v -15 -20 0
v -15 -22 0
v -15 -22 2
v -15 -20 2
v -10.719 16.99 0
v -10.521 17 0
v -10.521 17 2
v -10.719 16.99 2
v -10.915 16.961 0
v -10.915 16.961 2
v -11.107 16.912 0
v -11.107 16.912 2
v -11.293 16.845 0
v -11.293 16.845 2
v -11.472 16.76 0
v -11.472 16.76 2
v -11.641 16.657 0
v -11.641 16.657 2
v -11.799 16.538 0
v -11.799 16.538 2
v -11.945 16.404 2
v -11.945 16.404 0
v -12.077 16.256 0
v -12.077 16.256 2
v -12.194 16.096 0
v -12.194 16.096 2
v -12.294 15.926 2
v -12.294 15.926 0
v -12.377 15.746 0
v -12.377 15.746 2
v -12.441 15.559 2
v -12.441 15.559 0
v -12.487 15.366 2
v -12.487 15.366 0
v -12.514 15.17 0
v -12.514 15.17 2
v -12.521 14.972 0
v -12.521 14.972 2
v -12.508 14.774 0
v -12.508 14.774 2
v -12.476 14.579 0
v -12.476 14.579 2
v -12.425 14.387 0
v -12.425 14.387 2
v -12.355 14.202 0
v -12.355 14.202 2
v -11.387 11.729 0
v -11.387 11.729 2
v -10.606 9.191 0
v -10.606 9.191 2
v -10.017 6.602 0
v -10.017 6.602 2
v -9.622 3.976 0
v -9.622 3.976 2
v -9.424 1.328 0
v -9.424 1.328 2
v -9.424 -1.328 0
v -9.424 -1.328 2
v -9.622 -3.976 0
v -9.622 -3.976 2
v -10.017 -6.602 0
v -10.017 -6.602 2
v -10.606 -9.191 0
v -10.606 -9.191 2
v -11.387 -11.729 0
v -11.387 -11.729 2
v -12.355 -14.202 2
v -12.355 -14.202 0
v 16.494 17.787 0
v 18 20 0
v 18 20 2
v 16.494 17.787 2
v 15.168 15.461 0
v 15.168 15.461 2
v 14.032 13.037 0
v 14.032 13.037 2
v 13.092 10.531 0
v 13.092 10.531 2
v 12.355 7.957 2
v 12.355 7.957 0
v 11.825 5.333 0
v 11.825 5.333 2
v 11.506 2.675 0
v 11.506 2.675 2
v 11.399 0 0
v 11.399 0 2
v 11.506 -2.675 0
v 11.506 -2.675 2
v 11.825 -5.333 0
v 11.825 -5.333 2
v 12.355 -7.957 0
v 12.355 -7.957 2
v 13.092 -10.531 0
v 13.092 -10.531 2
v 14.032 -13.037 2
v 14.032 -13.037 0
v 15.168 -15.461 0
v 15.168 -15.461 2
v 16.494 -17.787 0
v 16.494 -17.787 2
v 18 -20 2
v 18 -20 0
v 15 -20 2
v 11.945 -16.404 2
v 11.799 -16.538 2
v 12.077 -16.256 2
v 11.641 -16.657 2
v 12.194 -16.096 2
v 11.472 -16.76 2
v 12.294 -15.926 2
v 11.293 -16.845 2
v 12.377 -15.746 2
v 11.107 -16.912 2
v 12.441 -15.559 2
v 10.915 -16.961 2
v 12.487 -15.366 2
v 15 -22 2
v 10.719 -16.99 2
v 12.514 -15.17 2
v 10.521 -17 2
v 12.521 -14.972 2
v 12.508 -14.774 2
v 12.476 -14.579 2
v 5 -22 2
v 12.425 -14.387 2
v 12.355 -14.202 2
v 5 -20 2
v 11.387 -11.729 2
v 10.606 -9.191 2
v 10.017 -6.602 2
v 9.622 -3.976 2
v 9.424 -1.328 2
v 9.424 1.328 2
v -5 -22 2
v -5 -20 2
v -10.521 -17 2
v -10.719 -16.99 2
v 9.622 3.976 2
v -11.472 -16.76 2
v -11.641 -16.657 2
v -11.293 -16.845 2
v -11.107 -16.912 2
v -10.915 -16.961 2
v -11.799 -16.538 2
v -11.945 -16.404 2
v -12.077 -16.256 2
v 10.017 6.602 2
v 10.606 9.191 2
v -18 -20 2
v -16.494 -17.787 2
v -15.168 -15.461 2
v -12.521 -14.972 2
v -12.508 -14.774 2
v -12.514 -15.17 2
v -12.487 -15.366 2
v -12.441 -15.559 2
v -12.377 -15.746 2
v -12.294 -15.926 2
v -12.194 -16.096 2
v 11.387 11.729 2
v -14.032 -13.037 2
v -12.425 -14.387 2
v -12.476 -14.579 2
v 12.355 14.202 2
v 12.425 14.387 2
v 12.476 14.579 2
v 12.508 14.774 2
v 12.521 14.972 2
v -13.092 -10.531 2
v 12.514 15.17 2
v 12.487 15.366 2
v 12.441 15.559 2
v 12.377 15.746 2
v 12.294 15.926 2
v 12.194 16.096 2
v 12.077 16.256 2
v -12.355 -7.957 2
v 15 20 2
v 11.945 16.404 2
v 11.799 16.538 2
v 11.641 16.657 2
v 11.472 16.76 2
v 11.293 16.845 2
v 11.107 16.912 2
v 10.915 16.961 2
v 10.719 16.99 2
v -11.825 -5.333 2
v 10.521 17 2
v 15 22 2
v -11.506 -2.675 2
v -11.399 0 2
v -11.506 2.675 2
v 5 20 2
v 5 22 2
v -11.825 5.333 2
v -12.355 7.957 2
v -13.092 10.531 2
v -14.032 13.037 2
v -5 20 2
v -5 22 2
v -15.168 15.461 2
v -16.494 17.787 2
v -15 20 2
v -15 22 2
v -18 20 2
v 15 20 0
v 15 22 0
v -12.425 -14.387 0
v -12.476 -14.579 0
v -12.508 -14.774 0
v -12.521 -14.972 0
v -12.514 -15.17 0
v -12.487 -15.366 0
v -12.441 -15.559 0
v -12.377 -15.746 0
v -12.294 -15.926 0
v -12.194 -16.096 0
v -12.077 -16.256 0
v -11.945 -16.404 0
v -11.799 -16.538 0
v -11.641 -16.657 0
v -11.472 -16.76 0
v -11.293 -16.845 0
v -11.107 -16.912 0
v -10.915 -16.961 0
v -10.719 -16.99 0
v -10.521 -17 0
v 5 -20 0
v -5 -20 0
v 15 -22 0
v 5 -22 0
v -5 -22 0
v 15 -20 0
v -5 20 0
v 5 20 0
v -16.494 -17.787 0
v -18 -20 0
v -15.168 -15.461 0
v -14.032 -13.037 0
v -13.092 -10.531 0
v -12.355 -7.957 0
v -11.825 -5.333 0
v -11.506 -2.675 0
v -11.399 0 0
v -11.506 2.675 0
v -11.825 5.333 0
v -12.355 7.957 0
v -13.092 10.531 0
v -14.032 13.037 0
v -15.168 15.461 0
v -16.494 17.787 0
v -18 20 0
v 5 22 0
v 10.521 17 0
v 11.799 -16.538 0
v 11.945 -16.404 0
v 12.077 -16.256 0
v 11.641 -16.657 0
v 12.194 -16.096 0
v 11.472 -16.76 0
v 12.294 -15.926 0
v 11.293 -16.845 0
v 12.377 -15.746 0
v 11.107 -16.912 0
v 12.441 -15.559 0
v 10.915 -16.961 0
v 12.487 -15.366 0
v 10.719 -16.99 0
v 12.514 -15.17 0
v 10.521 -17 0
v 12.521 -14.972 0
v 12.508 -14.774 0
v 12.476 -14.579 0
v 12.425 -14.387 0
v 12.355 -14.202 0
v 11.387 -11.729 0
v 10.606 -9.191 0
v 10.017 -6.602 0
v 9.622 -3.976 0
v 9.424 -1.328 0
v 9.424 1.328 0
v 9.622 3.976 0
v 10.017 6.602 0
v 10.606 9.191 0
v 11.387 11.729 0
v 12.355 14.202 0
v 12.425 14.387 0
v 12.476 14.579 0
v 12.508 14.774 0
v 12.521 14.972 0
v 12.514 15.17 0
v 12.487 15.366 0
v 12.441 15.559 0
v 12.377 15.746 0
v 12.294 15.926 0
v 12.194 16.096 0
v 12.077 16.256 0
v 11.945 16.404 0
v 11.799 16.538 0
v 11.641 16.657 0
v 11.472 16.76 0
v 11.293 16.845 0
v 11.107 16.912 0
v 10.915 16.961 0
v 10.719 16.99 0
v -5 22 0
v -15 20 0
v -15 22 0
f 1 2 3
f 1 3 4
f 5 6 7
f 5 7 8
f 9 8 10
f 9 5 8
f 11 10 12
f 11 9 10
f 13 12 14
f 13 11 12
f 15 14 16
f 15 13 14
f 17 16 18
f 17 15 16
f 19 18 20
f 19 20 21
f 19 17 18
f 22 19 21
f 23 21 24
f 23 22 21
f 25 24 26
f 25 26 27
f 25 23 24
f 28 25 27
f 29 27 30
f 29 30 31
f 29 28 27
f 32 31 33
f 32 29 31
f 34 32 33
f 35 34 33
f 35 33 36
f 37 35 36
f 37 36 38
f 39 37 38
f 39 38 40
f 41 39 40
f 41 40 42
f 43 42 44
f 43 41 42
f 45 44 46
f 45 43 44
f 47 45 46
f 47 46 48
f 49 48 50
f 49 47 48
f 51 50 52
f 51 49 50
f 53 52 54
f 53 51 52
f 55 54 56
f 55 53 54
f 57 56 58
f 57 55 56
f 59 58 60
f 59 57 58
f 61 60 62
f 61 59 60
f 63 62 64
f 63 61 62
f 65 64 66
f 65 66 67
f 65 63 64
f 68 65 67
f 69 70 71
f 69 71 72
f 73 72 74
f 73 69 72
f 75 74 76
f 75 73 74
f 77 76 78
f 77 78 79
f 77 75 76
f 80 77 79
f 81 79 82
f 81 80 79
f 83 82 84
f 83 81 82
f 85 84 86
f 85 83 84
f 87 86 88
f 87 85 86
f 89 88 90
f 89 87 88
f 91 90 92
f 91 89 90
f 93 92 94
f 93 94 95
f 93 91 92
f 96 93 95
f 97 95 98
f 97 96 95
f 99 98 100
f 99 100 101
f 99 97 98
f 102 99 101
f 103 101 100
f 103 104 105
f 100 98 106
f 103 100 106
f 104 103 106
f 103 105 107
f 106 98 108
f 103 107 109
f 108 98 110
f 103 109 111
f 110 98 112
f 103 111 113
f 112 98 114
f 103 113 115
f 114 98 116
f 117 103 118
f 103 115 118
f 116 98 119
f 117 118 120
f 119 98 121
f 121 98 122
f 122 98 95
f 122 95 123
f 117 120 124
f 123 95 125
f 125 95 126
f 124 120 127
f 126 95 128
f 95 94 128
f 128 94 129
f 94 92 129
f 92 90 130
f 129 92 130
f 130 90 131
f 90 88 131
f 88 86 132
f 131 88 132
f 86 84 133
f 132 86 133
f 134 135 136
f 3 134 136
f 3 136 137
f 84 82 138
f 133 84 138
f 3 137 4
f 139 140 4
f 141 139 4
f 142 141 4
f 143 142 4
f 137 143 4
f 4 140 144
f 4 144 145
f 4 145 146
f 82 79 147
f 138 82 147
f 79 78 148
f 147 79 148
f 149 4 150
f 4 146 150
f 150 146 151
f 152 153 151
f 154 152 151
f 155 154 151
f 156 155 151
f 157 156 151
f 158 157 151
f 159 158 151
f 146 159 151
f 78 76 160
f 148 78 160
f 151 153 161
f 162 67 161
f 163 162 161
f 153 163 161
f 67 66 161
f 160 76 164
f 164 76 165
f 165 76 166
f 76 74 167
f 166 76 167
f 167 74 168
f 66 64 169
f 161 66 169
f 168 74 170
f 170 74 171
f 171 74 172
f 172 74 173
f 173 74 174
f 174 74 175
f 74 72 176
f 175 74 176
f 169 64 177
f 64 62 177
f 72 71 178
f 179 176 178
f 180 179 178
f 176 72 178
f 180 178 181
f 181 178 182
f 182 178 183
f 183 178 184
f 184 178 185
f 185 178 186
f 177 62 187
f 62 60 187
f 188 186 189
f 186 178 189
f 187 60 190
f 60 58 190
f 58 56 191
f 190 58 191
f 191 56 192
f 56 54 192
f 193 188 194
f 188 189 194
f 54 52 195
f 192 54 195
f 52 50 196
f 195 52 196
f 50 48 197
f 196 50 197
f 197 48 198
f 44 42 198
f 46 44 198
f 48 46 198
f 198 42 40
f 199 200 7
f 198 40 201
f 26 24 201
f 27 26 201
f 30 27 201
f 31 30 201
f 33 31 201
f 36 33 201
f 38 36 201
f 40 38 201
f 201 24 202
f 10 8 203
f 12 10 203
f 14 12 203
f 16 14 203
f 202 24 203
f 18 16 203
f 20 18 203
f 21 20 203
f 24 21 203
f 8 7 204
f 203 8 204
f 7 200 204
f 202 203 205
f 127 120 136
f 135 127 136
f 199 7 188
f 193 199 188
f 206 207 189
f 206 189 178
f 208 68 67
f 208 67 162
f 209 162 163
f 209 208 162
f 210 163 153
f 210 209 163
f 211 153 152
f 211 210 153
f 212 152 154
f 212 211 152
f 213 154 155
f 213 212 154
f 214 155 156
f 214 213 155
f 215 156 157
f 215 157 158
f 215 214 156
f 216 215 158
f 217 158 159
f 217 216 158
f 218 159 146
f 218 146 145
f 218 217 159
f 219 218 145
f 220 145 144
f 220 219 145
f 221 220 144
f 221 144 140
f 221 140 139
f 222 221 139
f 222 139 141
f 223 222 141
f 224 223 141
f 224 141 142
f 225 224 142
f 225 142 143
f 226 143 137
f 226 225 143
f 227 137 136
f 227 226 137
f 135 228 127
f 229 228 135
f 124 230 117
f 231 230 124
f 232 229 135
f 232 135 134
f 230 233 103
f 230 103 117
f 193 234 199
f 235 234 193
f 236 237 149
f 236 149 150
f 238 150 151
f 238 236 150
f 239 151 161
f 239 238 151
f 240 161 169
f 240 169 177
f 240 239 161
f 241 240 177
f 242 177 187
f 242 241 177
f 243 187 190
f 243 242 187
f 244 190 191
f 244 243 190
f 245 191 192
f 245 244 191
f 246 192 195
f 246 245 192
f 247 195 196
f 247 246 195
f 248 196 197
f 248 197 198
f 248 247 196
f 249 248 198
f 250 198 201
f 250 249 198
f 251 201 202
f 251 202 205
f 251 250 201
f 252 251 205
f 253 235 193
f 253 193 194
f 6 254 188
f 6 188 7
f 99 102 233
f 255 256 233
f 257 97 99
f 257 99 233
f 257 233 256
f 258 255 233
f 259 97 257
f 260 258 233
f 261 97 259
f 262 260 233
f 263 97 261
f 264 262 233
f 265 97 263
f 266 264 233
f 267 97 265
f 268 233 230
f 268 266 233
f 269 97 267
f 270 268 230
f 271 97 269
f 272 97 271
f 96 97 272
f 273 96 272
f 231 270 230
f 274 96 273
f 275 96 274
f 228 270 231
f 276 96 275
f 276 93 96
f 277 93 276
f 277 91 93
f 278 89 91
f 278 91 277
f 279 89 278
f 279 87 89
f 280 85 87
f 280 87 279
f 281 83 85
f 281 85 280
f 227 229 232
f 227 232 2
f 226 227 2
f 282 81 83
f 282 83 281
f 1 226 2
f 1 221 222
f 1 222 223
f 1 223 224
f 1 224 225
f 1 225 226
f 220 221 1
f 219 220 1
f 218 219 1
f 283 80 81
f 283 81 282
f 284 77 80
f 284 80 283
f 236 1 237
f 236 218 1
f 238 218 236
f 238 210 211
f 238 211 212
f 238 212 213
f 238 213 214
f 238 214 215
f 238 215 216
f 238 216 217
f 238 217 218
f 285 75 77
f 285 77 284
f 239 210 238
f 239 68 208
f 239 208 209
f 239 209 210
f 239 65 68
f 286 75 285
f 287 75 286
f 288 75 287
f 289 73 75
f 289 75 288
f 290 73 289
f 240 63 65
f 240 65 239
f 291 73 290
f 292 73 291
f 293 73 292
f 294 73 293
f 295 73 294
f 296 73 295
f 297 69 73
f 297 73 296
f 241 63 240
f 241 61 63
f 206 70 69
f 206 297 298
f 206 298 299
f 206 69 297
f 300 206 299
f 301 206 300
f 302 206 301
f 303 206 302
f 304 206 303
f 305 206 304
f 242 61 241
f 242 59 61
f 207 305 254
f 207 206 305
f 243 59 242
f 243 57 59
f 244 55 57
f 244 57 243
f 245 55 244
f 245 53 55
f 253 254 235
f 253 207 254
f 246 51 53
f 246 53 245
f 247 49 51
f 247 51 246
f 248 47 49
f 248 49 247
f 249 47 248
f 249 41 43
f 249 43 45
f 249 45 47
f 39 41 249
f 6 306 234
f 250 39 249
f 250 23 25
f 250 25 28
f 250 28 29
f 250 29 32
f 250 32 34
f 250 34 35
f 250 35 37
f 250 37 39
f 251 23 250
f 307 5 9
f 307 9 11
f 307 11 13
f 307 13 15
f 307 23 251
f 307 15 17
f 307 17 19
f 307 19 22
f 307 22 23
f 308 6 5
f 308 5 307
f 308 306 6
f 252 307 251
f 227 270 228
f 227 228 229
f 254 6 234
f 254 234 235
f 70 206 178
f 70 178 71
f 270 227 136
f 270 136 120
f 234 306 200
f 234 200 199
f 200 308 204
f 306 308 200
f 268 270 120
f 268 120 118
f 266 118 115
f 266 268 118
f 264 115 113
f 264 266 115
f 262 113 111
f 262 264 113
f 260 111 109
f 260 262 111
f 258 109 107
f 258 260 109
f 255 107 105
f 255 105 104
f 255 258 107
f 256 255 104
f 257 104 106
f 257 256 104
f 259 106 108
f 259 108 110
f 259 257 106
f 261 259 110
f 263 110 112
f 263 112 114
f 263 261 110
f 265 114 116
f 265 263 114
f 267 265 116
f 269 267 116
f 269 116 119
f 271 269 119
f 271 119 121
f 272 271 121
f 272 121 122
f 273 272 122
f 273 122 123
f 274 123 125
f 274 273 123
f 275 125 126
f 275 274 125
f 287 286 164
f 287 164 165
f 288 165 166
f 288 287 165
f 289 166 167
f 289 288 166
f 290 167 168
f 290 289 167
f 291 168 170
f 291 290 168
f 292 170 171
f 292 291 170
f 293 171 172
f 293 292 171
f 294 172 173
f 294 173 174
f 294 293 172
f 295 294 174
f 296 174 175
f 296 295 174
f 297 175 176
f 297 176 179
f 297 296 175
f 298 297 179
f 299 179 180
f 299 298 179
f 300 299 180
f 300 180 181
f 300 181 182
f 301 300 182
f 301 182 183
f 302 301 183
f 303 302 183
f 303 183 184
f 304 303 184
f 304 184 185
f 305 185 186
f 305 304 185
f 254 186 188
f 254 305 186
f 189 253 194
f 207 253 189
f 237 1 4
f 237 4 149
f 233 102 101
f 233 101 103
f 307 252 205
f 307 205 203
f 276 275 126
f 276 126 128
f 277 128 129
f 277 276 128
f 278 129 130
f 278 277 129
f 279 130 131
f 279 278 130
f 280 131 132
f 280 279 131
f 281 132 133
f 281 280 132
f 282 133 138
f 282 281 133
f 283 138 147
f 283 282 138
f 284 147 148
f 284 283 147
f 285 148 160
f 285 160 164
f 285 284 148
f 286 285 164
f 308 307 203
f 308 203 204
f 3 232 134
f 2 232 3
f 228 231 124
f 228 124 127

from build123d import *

# Parameters (mm, degrees)
BOSS_EXTRUDE1_DEPTH = 2


with BuildPart() as part:
    # Sketch1 → Boss-Extrude1 (new body)
    with BuildSketch(Plane.XY):
        with BuildLine():
            Line((-18, 20), (-15, 20))
            Line((-15, 20), (-15, 22))
            Line((-15, 22), (-5, 22))
            Line((-5, 22), (-5, 20))
            Line((-5, 20), (5, 20))
            Line((5, 20), (5, 22))
            Line((5, 22), (15, 22))
            Line((15, 22), (15, 20))
            Line((15, 20), (18, 20))
            ThreePointArc((18, 20), (11.399404767, 0), (18, -20))
            Line((18, -20), (15, -20))
            Line((15, -20), (15, -22))
            Line((15, -22), (5, -22))
            Line((5, -22), (5, -20))
            Line((5, -20), (-5, -20))
            Line((-5, -20), (-5, -22))
            Line((-5, -22), (-15, -22))
            Line((-15, -22), (-15, -20))
            Line((-15, -20), (-18, -20))
            ThreePointArc((-18, -20), (-11.399404767, 0), (-18, 20))
        make_face()
        with BuildLine():
            Line((-10.520951842, -17), (10.520951842, -17))
            ThreePointArc((10.520951842, -17), (12.193632239, -16.096421584), (12.354914733, -14.20214029))
            ThreePointArc((12.354914733, -14.20214029), (9.399404767, 0), (12.354914733, 14.20214029))
            ThreePointArc((12.354914733, 14.20214029), (12.193632239, 16.096421584), (10.520951842, 17))
            Line((10.520951842, 17), (-10.520951842, 17))
            ThreePointArc((-10.520951842, 17), (-12.193632239, 16.096421584), (-12.354914733, 14.20214029))
            ThreePointArc((-12.354914733, 14.20214029), (-9.399404767, 0), (-12.354914733, -14.20214029))
            ThreePointArc((-12.354914733, -14.20214029), (-12.193632239, -16.096421584), (-10.520951842, -17))
        make_face(mode=Mode.SUBTRACT)
    extrude(amount=BOSS_EXTRUDE1_DEPTH)


solid = part.part
